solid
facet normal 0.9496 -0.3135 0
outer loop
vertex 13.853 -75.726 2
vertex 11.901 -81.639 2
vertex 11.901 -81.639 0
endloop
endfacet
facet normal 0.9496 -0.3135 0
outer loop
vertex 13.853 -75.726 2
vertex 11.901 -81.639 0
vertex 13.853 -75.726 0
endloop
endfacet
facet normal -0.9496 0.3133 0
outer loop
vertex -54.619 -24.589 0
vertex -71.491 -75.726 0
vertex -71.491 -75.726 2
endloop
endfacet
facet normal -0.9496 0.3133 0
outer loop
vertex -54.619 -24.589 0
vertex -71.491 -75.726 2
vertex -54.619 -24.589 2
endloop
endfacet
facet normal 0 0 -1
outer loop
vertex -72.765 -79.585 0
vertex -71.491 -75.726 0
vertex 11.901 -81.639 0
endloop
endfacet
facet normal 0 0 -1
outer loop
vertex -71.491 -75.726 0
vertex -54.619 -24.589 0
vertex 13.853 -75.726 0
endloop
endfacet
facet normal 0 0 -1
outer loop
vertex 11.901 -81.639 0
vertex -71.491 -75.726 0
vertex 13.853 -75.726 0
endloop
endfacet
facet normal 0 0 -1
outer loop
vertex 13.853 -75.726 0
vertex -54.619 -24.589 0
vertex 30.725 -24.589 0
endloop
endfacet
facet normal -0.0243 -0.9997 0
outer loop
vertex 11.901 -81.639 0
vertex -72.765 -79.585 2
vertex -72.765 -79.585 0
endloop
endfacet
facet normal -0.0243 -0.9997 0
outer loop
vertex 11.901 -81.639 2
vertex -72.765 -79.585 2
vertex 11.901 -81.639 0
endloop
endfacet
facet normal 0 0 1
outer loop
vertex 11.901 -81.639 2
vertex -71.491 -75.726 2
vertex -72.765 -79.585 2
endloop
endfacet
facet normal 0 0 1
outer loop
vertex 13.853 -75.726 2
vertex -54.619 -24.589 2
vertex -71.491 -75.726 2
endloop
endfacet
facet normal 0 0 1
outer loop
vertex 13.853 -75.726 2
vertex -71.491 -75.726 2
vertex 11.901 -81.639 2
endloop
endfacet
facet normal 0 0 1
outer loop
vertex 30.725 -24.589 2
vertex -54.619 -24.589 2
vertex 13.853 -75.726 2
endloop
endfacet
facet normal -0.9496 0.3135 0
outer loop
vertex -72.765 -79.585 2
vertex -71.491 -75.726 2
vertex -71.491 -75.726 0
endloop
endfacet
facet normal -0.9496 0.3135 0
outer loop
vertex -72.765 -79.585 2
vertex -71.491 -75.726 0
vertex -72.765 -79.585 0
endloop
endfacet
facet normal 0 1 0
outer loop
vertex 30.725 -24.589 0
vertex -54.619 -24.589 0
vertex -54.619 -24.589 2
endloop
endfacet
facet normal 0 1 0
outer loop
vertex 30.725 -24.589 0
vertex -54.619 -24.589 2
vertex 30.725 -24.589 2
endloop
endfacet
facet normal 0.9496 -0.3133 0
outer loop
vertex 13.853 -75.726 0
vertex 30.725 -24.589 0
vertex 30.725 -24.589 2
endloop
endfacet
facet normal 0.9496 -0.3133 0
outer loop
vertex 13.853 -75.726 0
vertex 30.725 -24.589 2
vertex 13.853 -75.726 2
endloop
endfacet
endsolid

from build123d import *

# Parameters (mm, degrees)
BOSS_EXTRUDE1_DEPTH = 2
BOSS_EXTRUDE2_DEPTH = 2


with BuildPart() as part:
    # Sketch2 → Boss-Extrude1 (new body)
    with BuildSketch(Plane.XY):
        Polygon((-54.61917065, -24.589230235), (30.72482935, -24.589230235), (13.852659447, -75.725684813), (-71.491340553, -75.725684813), align=None)
    extrude(amount=BOSS_EXTRUDE1_DEPTH)

    # Sketch3 → Boss-Extrude2 (add)
    with BuildSketch(Plane.XY.offset(2)):
        Polygon((-72.764711867, -79.585039875), (11.90144755, -81.639450446), (13.852659447, -75.725684813), (-71.491340553, -75.725684813), align=None)
    extrude(amount=-BOSS_EXTRUDE2_DEPTH)


solid = part.part
